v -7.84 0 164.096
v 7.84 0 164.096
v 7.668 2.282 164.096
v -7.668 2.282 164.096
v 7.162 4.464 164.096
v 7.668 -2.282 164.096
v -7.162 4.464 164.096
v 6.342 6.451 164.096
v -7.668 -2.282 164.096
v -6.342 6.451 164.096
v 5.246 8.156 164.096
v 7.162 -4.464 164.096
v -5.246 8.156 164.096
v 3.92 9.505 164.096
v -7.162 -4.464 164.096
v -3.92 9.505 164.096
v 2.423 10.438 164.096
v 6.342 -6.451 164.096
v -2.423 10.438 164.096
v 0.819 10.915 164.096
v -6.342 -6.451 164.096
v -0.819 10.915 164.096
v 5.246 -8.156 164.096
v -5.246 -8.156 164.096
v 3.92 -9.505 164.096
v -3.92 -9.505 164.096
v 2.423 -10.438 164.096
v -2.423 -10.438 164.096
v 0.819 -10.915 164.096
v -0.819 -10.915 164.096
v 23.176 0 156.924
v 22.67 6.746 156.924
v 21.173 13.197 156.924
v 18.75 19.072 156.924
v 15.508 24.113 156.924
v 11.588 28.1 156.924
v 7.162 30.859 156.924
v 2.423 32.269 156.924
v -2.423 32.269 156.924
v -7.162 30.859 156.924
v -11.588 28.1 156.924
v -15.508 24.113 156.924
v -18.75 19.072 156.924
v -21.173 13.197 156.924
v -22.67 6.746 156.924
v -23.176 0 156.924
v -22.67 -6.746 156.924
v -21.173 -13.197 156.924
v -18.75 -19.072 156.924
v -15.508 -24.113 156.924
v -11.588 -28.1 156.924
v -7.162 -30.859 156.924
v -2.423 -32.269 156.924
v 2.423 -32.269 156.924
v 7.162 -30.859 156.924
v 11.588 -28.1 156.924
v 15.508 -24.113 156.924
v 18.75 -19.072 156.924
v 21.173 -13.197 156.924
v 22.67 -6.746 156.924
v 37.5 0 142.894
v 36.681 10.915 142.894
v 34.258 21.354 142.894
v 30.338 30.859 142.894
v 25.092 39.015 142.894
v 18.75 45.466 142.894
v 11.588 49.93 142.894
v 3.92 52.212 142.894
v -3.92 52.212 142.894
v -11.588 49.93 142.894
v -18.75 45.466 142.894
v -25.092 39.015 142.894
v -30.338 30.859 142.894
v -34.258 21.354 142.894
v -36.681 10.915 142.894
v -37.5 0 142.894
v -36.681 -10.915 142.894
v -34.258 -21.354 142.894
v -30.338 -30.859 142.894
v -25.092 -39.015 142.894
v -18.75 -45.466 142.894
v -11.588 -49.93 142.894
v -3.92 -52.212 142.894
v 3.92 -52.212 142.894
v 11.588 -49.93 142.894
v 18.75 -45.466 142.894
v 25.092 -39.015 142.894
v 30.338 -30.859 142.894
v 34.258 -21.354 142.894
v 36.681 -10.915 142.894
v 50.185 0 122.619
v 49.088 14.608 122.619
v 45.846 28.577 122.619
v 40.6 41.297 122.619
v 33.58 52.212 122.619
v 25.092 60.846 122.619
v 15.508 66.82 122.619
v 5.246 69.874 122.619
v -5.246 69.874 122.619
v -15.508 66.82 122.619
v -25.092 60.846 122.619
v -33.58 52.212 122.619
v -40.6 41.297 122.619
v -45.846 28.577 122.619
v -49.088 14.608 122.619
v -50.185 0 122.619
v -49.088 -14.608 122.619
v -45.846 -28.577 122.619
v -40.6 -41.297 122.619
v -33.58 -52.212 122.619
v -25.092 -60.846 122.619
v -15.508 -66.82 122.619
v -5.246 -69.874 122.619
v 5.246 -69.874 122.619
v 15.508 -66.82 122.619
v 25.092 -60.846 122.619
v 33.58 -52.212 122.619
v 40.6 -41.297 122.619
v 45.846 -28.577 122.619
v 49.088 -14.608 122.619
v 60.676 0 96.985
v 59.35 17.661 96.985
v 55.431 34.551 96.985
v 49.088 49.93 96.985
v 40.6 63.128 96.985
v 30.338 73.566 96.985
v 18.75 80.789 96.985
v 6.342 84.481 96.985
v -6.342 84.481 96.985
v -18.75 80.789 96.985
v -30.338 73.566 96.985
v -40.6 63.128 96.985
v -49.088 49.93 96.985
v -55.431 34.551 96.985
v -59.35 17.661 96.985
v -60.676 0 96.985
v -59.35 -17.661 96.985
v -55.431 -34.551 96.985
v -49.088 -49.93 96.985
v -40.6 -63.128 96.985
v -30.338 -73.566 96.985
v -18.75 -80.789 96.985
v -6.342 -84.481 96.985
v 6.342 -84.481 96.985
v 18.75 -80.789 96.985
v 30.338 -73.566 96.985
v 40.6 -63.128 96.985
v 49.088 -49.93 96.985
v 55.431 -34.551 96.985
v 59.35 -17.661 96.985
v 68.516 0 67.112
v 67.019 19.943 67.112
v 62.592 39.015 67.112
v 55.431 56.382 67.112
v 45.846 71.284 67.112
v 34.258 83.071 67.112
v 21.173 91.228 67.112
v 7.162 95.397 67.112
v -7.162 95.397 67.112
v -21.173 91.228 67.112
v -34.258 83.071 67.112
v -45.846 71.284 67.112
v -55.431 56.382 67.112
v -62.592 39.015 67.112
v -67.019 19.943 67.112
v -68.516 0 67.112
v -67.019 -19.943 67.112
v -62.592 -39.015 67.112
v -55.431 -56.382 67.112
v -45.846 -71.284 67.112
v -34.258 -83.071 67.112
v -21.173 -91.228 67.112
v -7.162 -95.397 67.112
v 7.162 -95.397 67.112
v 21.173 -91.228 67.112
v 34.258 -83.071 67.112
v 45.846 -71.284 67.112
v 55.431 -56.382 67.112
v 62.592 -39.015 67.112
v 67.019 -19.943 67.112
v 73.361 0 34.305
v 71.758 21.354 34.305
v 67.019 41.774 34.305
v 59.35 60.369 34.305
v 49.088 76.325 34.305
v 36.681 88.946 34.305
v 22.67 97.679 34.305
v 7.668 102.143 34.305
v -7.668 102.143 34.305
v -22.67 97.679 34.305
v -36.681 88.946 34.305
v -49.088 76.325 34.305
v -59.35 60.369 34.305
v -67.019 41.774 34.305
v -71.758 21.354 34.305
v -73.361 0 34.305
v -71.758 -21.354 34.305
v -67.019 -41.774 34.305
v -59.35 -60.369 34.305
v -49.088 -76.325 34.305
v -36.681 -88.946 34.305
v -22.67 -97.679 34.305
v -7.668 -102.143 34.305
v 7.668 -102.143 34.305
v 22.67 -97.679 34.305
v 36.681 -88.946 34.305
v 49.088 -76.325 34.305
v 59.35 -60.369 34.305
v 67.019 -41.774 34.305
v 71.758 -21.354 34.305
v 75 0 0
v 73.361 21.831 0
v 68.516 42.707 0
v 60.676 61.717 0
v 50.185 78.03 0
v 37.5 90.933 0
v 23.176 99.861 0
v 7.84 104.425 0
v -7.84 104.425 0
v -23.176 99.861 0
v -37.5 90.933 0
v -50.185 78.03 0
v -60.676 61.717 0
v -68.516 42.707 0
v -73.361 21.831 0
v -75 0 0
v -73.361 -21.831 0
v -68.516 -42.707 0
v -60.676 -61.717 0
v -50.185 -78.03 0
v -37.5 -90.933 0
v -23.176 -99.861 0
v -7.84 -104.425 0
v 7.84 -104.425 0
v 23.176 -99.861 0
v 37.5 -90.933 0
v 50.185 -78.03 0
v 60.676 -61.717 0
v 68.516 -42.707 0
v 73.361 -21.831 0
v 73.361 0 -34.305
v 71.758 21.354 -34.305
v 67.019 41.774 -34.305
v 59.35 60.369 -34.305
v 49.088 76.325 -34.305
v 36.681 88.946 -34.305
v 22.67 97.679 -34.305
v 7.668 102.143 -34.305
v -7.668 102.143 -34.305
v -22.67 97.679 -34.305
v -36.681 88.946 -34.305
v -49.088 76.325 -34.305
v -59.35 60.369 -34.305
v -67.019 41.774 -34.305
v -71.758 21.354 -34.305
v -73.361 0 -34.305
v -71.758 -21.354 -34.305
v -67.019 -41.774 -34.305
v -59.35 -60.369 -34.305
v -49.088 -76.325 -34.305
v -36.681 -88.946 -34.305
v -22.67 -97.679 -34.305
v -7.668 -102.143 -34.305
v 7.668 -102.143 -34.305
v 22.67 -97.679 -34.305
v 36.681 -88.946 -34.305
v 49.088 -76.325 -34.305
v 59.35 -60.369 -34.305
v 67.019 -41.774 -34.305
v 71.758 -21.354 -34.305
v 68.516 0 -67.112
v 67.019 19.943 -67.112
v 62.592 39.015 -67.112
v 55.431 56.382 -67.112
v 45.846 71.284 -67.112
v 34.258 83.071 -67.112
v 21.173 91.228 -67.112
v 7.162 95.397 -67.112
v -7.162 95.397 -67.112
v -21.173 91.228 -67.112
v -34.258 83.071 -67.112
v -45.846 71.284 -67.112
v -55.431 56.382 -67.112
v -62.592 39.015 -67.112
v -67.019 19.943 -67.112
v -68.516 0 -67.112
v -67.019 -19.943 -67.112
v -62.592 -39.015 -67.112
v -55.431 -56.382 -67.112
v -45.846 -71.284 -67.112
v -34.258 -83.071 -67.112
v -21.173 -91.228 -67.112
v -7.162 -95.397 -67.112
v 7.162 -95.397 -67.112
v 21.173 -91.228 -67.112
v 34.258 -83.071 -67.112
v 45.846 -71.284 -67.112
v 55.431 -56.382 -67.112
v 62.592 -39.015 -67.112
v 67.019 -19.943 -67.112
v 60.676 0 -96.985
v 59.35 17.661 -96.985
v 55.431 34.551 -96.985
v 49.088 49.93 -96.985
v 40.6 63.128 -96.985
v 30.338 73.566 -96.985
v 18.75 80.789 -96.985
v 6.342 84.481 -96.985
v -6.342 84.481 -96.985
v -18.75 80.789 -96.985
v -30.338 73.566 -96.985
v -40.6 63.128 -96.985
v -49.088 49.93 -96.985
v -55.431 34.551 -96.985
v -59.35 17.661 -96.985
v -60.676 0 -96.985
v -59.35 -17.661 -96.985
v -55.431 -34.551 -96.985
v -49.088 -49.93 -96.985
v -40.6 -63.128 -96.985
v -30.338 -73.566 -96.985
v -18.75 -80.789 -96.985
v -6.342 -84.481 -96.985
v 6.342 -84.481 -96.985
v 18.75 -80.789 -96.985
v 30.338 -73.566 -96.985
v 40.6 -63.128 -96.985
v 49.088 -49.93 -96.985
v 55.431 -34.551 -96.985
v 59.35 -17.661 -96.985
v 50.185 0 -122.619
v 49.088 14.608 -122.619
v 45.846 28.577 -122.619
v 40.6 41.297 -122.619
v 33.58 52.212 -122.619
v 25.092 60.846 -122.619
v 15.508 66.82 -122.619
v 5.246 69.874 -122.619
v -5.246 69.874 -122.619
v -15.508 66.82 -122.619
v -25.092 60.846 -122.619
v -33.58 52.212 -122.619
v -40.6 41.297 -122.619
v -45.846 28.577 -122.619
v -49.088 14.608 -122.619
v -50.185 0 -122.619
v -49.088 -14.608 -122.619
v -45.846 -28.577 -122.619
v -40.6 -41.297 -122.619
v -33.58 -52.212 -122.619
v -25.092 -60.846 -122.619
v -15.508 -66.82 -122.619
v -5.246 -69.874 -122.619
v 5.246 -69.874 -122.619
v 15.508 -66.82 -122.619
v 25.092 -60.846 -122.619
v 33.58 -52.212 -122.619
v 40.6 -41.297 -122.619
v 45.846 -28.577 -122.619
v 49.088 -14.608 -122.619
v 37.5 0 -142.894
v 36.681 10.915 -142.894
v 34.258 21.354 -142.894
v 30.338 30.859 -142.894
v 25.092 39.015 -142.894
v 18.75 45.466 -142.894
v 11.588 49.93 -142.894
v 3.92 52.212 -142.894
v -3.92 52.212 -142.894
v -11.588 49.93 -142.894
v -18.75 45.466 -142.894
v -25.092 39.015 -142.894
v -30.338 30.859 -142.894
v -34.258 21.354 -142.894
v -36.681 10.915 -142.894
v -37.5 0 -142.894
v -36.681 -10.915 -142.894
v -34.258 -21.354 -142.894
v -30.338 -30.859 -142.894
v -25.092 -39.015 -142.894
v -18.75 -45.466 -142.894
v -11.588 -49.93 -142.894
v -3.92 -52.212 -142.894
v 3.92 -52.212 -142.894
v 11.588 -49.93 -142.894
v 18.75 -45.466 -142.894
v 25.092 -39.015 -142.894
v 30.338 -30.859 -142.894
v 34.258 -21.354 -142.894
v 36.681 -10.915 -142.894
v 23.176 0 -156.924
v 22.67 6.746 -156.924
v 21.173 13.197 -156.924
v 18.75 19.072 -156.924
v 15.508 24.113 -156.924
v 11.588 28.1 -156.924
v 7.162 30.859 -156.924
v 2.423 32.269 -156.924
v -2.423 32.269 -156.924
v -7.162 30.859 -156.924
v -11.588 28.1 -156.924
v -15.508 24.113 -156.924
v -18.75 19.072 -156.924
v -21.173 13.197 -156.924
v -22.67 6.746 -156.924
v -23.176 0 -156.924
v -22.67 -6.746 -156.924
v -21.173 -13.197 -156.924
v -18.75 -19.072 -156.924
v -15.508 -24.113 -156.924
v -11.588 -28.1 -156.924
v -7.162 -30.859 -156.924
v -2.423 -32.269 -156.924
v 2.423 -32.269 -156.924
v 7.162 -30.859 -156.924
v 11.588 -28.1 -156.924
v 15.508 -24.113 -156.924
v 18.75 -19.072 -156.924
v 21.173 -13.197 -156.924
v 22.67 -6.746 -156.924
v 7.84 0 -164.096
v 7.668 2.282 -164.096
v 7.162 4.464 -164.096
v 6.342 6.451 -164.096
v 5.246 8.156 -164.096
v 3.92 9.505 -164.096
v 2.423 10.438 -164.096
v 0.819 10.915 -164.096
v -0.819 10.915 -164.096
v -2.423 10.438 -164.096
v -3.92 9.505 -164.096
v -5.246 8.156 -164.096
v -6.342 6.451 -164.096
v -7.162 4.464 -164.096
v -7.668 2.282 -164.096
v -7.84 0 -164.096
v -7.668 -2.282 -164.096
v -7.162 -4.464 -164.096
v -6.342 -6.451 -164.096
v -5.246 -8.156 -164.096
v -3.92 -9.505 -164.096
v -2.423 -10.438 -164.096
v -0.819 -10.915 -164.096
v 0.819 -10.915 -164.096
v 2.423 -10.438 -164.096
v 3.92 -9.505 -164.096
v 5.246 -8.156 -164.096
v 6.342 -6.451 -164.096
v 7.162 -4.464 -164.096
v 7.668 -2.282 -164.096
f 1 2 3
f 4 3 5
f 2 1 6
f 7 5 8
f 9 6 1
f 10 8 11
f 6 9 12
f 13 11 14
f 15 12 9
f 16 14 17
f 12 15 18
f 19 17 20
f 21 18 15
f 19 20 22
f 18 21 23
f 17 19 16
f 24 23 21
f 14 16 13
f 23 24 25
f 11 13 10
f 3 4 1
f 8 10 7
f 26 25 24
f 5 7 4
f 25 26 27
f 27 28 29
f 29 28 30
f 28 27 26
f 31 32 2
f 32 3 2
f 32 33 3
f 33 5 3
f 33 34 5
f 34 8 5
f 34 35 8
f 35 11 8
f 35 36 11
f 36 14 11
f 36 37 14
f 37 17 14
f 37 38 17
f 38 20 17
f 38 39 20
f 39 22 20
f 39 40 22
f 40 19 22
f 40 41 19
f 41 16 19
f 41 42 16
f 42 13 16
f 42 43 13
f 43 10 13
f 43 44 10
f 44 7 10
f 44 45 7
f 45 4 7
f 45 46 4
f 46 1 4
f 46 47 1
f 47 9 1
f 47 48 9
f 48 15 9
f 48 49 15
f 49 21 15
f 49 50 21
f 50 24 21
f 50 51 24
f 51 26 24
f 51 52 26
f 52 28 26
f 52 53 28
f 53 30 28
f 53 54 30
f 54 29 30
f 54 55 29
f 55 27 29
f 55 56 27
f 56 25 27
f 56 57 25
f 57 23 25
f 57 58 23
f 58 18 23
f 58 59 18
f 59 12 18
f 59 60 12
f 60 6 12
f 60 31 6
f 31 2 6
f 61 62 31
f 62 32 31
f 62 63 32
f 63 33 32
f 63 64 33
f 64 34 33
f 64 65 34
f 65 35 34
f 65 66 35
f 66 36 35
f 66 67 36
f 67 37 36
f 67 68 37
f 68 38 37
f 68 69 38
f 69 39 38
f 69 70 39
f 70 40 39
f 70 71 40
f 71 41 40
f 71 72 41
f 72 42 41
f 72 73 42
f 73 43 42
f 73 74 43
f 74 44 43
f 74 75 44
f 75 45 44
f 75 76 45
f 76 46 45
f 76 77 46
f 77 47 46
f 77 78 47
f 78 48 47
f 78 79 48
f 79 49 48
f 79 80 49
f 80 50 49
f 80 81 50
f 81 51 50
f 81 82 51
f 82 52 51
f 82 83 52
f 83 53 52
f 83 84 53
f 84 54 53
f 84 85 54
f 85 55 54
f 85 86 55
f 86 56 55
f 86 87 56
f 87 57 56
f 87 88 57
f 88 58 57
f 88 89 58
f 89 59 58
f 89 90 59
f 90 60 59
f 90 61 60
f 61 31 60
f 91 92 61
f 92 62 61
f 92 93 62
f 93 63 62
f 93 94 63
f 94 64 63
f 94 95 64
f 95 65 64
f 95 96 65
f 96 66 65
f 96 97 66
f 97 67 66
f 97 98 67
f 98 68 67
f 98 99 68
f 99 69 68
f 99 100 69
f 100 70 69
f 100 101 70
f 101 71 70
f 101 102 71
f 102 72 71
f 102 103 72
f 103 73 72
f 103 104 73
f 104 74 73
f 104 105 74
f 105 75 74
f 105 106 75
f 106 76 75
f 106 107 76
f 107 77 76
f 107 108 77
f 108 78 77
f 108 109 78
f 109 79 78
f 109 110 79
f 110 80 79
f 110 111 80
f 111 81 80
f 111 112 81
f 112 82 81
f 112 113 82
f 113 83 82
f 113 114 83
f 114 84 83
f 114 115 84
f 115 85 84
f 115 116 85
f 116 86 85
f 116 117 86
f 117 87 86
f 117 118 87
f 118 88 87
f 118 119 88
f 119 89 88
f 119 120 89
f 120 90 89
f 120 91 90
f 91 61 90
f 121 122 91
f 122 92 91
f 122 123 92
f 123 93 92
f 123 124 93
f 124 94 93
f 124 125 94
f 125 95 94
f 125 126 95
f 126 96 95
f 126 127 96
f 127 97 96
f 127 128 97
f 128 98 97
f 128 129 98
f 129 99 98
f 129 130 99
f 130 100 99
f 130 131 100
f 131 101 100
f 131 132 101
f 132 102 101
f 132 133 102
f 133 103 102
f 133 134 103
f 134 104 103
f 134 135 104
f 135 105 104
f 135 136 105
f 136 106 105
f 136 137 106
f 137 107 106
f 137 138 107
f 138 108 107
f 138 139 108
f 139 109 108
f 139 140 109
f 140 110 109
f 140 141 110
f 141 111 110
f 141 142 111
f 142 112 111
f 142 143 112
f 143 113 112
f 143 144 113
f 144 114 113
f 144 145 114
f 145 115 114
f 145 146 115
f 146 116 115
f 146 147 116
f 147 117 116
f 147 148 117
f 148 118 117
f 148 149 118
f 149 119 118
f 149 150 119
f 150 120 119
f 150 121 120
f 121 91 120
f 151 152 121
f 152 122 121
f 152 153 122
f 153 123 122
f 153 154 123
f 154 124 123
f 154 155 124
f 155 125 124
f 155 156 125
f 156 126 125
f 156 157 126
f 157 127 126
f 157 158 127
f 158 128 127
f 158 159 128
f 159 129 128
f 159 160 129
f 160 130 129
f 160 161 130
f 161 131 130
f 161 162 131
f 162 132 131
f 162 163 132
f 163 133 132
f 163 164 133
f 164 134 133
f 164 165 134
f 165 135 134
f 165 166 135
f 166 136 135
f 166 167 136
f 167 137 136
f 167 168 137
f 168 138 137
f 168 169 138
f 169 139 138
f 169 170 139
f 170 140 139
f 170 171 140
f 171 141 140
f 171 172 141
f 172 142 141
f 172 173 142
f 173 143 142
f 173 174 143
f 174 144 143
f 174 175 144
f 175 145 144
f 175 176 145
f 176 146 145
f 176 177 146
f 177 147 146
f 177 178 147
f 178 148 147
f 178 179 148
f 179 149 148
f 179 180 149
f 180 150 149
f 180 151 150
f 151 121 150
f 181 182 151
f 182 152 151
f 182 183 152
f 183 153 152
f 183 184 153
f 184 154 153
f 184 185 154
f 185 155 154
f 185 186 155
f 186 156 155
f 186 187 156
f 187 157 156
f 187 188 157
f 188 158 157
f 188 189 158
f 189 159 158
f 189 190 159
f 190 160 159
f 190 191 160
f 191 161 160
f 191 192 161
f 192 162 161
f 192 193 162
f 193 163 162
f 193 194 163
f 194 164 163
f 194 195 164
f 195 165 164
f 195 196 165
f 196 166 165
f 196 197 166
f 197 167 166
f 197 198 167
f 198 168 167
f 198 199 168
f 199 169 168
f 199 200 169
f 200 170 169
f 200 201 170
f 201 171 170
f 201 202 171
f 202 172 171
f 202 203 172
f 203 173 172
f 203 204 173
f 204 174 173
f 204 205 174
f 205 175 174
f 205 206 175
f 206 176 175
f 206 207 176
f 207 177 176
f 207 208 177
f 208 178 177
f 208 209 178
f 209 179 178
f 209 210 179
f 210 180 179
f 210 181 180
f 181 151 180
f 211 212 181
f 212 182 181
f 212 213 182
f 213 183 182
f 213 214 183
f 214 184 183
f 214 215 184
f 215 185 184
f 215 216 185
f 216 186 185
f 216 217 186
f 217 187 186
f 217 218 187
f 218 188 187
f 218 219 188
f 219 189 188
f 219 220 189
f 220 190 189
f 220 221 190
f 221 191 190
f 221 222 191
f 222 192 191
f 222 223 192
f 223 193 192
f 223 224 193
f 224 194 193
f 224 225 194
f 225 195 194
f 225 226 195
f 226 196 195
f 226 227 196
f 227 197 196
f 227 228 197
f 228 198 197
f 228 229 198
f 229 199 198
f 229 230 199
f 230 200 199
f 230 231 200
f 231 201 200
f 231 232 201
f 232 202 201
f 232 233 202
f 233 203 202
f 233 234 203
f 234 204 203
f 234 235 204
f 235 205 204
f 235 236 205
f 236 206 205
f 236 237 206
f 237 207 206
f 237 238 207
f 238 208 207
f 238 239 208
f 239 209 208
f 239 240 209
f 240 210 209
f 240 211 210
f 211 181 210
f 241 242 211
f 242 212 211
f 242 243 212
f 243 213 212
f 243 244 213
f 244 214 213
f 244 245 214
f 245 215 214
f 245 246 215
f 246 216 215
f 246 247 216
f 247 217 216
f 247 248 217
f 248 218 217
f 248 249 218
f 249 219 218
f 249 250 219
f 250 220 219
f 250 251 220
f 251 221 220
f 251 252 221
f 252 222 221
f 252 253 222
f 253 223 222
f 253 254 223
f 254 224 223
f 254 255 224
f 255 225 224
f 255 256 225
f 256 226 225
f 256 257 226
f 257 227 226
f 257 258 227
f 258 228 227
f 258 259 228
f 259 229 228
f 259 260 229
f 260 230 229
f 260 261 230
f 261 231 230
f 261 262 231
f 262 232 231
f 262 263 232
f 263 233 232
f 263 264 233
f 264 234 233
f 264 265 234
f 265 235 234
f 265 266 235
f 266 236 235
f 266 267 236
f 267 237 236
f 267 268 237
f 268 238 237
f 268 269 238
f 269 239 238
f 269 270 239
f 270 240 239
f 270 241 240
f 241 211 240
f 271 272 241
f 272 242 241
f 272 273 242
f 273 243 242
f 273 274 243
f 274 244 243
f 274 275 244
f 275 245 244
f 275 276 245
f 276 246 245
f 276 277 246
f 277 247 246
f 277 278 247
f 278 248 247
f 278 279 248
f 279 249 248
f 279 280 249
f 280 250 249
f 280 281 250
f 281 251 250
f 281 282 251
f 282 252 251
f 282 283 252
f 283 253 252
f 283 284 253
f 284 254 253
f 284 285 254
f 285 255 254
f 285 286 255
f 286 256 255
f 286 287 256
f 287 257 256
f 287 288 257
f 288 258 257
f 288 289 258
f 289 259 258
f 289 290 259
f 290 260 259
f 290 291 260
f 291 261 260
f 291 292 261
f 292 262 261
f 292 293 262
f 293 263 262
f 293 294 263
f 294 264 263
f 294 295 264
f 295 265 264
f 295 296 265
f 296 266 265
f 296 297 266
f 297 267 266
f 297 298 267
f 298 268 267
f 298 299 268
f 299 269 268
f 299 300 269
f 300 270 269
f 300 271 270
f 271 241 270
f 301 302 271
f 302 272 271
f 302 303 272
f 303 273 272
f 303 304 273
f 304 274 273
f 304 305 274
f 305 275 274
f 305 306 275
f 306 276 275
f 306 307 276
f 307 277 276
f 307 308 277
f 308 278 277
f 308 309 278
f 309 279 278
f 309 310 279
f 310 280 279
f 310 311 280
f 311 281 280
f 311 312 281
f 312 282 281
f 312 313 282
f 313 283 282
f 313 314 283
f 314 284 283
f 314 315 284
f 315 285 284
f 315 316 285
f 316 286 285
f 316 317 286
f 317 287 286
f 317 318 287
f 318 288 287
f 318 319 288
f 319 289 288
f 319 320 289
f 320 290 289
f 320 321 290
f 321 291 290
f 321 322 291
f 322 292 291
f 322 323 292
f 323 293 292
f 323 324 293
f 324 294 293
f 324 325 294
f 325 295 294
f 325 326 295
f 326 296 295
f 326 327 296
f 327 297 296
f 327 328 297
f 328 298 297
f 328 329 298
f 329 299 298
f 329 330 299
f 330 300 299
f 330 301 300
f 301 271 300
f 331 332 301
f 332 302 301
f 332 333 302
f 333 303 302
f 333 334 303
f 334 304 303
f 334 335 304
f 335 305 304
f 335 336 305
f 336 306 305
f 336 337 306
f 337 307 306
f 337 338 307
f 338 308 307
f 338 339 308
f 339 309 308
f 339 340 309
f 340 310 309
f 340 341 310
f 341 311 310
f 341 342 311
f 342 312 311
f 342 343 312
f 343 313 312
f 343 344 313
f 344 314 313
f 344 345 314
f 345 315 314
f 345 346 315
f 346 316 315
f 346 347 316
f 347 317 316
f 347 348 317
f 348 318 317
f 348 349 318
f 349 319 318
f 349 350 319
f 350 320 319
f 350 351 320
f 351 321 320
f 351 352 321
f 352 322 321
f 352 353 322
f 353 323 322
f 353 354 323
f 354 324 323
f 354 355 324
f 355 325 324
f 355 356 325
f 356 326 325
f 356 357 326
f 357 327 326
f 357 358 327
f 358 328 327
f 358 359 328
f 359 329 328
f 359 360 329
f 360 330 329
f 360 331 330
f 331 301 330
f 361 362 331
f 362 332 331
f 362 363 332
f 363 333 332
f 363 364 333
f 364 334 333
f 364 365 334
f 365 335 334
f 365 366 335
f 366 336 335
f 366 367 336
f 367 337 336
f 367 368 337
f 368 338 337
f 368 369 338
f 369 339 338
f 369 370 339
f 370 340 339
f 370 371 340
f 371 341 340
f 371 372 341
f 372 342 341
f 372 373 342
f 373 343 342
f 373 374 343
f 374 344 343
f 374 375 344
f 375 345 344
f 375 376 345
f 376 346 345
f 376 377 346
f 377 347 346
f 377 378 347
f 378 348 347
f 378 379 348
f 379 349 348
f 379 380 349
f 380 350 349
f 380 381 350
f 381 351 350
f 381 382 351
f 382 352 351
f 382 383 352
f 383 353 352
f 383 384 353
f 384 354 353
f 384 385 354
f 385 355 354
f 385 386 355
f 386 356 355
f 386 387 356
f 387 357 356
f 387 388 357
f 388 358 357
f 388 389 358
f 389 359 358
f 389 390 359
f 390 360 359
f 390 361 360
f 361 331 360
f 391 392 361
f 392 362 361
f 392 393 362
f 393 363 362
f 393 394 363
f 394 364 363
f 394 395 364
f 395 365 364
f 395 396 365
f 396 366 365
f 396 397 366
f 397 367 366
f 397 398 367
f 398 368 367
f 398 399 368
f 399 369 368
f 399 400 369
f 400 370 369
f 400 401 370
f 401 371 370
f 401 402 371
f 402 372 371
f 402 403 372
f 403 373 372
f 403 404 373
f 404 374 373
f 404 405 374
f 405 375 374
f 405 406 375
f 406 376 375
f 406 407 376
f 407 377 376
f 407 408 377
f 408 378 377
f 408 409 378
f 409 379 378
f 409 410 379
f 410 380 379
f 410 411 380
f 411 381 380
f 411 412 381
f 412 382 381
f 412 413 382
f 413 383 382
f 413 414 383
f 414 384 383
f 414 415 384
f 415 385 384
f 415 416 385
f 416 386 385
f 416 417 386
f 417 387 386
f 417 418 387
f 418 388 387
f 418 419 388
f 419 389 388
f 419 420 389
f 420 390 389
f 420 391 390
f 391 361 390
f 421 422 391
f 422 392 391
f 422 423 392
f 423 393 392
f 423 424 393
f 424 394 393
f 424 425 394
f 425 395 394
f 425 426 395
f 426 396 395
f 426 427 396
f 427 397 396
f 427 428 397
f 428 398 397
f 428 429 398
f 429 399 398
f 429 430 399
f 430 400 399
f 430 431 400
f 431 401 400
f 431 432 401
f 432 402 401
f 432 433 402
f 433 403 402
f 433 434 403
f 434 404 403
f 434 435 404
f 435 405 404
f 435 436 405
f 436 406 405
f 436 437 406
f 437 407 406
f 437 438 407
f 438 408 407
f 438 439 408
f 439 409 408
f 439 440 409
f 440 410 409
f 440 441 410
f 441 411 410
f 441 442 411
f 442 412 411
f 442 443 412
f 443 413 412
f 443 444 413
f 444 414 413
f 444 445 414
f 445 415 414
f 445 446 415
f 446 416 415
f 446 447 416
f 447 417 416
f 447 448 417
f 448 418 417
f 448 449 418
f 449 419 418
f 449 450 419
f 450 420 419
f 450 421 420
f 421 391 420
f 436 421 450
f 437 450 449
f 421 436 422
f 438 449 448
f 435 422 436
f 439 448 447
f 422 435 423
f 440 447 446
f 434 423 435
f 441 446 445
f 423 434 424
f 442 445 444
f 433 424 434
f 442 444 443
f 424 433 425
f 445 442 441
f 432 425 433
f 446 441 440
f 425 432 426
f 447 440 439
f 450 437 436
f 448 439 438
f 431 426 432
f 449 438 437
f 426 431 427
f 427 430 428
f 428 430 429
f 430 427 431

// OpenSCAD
// Generated by SolidPython 1.0.1 on 2020-07-29 00:39:26


scale(v = [5, 7, 11]) {
	sphere(r = 15);
}
/***********************************************
*********      SolidPython code:      **********
************************************************
 
# import packages: SolidPython
from solid import *
from solid.utils import *
from itertools import chain, combinations


class Resize:

    def __init__(self, scad_file):
        self.scad_file = scad_file
        #self.scad_file = import_scad(scad_file)
        # cone/cylinder param:
        self.r1 = 0
        self.r2 = 0
        self.h = 0
        # rectangular prism param:
        self.w = 0
        self.l = 0
        # ellipse param:
        self.r = 0

    # import OpenScad code (file name corresponds to shape)


    # classify shape + parameters
    def assign(self, param1, param2, param3):
        if self.scad_file == 'cone.scad':
            self.r1 = param1
            self.r2 = param2
            self.h = param3
        elif self.scad_file == 'cylinder.scad':
            self.r1 = param1
            self.r2 = param2
            self.h = param3
        elif self.scad_file == 'rectangularPrism.scad':
            self.h = param1
            self.l = param2
            self.w = param3
        else:
            self.r = param1
            self.h = param2

    # resize parameters
    def iterate(self):
        x = range(3, 20, 2)
        i = 1
        if self.scad_file == 'cone.scad':
            tempList = list(combinations(x, 2))
            for temp in tempList:
                param1 = temp[0]
                param2 = temp[1]
                filepath = 'produced_scad_files/' + 'cone' + str(param1) + '_' + str(param2) + '_' + '.scad'
                scad_render_to_file(cylinder(h=param1, r1=param2, r2=0), filepath)

        elif self.scad_file == 'cylinder.scad':
            tempList = list(combinations(x, 3))
            for temp in tempList:
                param1 = temp[0]
                param2 = temp[1]
                filepath = 'produced_scad_files/' + 'cylinder' + str(param1) + '_' + str(param2) + '_' + '.scad'
                scad_render_to_file(cylinder(h=param1, r1=param2, r2=param2), filepath)

        elif self.scad_file == 'rectangularPrism.scad':
            tempList = list(combinations(x, 3))
            for temp in tempList:
                param1 = temp[0]
                param2 = temp[1]
                param3 = temp[2]
                filepath = 'produced_scad_files/' + 'rectangularPrism' + str(param1) + '_' + str(param2) + '_' + str(
                    param3) + '.scad'
                scad_render_to_file(cube(size=(param1, param2, param3)), filepath)

        elif self.scad_file == 'ellipse.scad':
            tempList = list(combinations(x, 4))
            for temp in tempList:
                param1 = temp[0]
                param2 = temp[1]
                param3 = temp[2]
                param4 = temp[3]
                filepath = 'produced_scad_files/' + 'ellipse' + str(param1) + '_' + str(param2) + '_' + str(param3) + '_' + str(param4) + '.scad'
                scad_render_to_file(scale([param1, param2, param3])(sphere(r=param4)), filepath)

    def render_to_scadfile(self):
        scad_render_to_file(scad, 'example.scad') 
 
************************************************/
